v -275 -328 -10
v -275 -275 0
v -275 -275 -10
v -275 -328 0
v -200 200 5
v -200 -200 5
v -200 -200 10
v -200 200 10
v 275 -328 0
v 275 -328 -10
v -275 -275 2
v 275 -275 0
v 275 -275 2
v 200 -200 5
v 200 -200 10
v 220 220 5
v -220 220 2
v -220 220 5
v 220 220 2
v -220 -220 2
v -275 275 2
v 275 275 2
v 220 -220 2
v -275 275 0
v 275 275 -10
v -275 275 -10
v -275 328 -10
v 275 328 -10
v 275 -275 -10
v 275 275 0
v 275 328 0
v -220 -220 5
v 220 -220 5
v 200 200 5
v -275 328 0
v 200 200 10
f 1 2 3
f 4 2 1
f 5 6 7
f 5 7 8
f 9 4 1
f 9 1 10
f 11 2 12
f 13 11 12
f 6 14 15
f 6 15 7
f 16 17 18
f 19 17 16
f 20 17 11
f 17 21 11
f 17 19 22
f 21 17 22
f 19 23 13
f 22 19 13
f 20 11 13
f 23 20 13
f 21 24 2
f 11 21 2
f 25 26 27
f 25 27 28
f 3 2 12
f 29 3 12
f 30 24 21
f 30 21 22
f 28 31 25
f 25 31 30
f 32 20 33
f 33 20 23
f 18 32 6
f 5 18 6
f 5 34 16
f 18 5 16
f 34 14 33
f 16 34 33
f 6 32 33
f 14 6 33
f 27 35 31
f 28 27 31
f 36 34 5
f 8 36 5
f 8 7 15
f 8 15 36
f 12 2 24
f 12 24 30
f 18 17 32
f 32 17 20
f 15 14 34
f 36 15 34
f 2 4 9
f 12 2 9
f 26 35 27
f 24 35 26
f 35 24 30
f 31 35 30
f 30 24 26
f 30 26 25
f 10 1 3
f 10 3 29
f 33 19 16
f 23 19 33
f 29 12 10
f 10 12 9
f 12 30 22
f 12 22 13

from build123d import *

# Parameters (mm, degrees)
SKETCH1_W             = 400
SKETCH1_H             = 400
BOSS_EXTRUDE1_DEPTH   = 10
SKETCH2_W             = 440
SKETCH2_H             = 440
BOSS_EXTRUDE2_DEPTH   = 5
SKETCH3_W             = 550
SKETCH3_H             = 550
BOSS_EXTRUDE3_DEPTH   = 2
SKETCH4_W             = 550
SKETCH4_H             = 53
BOSS_EXTRUDE4_DEPTH   = 10
BOSS_EXTRUDE4_2_DEPTH = 10


with BuildPart() as part:
    # Sketch1 → Boss-Extrude1 (new body)
    with BuildSketch(Plane(origin=(0, 0, 0), x_dir=(0, 1, 0), z_dir=(0, 0, 1))):
        Rectangle(SKETCH1_W, SKETCH1_H)
    extrude(amount=BOSS_EXTRUDE1_DEPTH)

    # Sketch2 → Boss-Extrude2 (add)
    with BuildSketch(Plane(origin=(0, 0, 0), x_dir=(1, 0, 0), z_dir=(0, 0, -1))):
        Rectangle(SKETCH2_W, SKETCH2_H)
    extrude(amount=-BOSS_EXTRUDE2_DEPTH)

    # Sketch3 → Boss-Extrude3 (add)
    with BuildSketch(Plane(origin=(0, 0, 0), x_dir=(1, 0, 0), z_dir=(0, 0, -1))):
        Rectangle(SKETCH3_W, SKETCH3_H)
    extrude(amount=-BOSS_EXTRUDE3_DEPTH)


with BuildPart() as body_2:
    # Sketch4 → Boss-Extrude4 (new body)
    with BuildSketch(Plane(origin=(0, 0, 0), x_dir=(1, 0, 0), z_dir=(0, 0, -1))):
        with Locations((0, 301.5)):
            Rectangle(SKETCH4_W, SKETCH4_H)
    extrude(amount=BOSS_EXTRUDE4_DEPTH)


with BuildPart() as body_3:
    # Sketch4 → Boss-Extrude4 2 (new body)
    with BuildSketch(Plane(origin=(0, 0, 0), x_dir=(1, 0, 0), z_dir=(0, 0, -1))):
        with Locations((0, -301.5)):
            Rectangle(SKETCH4_W, SKETCH4_H)
    extrude(amount=BOSS_EXTRUDE4_2_DEPTH)


solid = Compound([part.part, body_2.part, body_3.part])
